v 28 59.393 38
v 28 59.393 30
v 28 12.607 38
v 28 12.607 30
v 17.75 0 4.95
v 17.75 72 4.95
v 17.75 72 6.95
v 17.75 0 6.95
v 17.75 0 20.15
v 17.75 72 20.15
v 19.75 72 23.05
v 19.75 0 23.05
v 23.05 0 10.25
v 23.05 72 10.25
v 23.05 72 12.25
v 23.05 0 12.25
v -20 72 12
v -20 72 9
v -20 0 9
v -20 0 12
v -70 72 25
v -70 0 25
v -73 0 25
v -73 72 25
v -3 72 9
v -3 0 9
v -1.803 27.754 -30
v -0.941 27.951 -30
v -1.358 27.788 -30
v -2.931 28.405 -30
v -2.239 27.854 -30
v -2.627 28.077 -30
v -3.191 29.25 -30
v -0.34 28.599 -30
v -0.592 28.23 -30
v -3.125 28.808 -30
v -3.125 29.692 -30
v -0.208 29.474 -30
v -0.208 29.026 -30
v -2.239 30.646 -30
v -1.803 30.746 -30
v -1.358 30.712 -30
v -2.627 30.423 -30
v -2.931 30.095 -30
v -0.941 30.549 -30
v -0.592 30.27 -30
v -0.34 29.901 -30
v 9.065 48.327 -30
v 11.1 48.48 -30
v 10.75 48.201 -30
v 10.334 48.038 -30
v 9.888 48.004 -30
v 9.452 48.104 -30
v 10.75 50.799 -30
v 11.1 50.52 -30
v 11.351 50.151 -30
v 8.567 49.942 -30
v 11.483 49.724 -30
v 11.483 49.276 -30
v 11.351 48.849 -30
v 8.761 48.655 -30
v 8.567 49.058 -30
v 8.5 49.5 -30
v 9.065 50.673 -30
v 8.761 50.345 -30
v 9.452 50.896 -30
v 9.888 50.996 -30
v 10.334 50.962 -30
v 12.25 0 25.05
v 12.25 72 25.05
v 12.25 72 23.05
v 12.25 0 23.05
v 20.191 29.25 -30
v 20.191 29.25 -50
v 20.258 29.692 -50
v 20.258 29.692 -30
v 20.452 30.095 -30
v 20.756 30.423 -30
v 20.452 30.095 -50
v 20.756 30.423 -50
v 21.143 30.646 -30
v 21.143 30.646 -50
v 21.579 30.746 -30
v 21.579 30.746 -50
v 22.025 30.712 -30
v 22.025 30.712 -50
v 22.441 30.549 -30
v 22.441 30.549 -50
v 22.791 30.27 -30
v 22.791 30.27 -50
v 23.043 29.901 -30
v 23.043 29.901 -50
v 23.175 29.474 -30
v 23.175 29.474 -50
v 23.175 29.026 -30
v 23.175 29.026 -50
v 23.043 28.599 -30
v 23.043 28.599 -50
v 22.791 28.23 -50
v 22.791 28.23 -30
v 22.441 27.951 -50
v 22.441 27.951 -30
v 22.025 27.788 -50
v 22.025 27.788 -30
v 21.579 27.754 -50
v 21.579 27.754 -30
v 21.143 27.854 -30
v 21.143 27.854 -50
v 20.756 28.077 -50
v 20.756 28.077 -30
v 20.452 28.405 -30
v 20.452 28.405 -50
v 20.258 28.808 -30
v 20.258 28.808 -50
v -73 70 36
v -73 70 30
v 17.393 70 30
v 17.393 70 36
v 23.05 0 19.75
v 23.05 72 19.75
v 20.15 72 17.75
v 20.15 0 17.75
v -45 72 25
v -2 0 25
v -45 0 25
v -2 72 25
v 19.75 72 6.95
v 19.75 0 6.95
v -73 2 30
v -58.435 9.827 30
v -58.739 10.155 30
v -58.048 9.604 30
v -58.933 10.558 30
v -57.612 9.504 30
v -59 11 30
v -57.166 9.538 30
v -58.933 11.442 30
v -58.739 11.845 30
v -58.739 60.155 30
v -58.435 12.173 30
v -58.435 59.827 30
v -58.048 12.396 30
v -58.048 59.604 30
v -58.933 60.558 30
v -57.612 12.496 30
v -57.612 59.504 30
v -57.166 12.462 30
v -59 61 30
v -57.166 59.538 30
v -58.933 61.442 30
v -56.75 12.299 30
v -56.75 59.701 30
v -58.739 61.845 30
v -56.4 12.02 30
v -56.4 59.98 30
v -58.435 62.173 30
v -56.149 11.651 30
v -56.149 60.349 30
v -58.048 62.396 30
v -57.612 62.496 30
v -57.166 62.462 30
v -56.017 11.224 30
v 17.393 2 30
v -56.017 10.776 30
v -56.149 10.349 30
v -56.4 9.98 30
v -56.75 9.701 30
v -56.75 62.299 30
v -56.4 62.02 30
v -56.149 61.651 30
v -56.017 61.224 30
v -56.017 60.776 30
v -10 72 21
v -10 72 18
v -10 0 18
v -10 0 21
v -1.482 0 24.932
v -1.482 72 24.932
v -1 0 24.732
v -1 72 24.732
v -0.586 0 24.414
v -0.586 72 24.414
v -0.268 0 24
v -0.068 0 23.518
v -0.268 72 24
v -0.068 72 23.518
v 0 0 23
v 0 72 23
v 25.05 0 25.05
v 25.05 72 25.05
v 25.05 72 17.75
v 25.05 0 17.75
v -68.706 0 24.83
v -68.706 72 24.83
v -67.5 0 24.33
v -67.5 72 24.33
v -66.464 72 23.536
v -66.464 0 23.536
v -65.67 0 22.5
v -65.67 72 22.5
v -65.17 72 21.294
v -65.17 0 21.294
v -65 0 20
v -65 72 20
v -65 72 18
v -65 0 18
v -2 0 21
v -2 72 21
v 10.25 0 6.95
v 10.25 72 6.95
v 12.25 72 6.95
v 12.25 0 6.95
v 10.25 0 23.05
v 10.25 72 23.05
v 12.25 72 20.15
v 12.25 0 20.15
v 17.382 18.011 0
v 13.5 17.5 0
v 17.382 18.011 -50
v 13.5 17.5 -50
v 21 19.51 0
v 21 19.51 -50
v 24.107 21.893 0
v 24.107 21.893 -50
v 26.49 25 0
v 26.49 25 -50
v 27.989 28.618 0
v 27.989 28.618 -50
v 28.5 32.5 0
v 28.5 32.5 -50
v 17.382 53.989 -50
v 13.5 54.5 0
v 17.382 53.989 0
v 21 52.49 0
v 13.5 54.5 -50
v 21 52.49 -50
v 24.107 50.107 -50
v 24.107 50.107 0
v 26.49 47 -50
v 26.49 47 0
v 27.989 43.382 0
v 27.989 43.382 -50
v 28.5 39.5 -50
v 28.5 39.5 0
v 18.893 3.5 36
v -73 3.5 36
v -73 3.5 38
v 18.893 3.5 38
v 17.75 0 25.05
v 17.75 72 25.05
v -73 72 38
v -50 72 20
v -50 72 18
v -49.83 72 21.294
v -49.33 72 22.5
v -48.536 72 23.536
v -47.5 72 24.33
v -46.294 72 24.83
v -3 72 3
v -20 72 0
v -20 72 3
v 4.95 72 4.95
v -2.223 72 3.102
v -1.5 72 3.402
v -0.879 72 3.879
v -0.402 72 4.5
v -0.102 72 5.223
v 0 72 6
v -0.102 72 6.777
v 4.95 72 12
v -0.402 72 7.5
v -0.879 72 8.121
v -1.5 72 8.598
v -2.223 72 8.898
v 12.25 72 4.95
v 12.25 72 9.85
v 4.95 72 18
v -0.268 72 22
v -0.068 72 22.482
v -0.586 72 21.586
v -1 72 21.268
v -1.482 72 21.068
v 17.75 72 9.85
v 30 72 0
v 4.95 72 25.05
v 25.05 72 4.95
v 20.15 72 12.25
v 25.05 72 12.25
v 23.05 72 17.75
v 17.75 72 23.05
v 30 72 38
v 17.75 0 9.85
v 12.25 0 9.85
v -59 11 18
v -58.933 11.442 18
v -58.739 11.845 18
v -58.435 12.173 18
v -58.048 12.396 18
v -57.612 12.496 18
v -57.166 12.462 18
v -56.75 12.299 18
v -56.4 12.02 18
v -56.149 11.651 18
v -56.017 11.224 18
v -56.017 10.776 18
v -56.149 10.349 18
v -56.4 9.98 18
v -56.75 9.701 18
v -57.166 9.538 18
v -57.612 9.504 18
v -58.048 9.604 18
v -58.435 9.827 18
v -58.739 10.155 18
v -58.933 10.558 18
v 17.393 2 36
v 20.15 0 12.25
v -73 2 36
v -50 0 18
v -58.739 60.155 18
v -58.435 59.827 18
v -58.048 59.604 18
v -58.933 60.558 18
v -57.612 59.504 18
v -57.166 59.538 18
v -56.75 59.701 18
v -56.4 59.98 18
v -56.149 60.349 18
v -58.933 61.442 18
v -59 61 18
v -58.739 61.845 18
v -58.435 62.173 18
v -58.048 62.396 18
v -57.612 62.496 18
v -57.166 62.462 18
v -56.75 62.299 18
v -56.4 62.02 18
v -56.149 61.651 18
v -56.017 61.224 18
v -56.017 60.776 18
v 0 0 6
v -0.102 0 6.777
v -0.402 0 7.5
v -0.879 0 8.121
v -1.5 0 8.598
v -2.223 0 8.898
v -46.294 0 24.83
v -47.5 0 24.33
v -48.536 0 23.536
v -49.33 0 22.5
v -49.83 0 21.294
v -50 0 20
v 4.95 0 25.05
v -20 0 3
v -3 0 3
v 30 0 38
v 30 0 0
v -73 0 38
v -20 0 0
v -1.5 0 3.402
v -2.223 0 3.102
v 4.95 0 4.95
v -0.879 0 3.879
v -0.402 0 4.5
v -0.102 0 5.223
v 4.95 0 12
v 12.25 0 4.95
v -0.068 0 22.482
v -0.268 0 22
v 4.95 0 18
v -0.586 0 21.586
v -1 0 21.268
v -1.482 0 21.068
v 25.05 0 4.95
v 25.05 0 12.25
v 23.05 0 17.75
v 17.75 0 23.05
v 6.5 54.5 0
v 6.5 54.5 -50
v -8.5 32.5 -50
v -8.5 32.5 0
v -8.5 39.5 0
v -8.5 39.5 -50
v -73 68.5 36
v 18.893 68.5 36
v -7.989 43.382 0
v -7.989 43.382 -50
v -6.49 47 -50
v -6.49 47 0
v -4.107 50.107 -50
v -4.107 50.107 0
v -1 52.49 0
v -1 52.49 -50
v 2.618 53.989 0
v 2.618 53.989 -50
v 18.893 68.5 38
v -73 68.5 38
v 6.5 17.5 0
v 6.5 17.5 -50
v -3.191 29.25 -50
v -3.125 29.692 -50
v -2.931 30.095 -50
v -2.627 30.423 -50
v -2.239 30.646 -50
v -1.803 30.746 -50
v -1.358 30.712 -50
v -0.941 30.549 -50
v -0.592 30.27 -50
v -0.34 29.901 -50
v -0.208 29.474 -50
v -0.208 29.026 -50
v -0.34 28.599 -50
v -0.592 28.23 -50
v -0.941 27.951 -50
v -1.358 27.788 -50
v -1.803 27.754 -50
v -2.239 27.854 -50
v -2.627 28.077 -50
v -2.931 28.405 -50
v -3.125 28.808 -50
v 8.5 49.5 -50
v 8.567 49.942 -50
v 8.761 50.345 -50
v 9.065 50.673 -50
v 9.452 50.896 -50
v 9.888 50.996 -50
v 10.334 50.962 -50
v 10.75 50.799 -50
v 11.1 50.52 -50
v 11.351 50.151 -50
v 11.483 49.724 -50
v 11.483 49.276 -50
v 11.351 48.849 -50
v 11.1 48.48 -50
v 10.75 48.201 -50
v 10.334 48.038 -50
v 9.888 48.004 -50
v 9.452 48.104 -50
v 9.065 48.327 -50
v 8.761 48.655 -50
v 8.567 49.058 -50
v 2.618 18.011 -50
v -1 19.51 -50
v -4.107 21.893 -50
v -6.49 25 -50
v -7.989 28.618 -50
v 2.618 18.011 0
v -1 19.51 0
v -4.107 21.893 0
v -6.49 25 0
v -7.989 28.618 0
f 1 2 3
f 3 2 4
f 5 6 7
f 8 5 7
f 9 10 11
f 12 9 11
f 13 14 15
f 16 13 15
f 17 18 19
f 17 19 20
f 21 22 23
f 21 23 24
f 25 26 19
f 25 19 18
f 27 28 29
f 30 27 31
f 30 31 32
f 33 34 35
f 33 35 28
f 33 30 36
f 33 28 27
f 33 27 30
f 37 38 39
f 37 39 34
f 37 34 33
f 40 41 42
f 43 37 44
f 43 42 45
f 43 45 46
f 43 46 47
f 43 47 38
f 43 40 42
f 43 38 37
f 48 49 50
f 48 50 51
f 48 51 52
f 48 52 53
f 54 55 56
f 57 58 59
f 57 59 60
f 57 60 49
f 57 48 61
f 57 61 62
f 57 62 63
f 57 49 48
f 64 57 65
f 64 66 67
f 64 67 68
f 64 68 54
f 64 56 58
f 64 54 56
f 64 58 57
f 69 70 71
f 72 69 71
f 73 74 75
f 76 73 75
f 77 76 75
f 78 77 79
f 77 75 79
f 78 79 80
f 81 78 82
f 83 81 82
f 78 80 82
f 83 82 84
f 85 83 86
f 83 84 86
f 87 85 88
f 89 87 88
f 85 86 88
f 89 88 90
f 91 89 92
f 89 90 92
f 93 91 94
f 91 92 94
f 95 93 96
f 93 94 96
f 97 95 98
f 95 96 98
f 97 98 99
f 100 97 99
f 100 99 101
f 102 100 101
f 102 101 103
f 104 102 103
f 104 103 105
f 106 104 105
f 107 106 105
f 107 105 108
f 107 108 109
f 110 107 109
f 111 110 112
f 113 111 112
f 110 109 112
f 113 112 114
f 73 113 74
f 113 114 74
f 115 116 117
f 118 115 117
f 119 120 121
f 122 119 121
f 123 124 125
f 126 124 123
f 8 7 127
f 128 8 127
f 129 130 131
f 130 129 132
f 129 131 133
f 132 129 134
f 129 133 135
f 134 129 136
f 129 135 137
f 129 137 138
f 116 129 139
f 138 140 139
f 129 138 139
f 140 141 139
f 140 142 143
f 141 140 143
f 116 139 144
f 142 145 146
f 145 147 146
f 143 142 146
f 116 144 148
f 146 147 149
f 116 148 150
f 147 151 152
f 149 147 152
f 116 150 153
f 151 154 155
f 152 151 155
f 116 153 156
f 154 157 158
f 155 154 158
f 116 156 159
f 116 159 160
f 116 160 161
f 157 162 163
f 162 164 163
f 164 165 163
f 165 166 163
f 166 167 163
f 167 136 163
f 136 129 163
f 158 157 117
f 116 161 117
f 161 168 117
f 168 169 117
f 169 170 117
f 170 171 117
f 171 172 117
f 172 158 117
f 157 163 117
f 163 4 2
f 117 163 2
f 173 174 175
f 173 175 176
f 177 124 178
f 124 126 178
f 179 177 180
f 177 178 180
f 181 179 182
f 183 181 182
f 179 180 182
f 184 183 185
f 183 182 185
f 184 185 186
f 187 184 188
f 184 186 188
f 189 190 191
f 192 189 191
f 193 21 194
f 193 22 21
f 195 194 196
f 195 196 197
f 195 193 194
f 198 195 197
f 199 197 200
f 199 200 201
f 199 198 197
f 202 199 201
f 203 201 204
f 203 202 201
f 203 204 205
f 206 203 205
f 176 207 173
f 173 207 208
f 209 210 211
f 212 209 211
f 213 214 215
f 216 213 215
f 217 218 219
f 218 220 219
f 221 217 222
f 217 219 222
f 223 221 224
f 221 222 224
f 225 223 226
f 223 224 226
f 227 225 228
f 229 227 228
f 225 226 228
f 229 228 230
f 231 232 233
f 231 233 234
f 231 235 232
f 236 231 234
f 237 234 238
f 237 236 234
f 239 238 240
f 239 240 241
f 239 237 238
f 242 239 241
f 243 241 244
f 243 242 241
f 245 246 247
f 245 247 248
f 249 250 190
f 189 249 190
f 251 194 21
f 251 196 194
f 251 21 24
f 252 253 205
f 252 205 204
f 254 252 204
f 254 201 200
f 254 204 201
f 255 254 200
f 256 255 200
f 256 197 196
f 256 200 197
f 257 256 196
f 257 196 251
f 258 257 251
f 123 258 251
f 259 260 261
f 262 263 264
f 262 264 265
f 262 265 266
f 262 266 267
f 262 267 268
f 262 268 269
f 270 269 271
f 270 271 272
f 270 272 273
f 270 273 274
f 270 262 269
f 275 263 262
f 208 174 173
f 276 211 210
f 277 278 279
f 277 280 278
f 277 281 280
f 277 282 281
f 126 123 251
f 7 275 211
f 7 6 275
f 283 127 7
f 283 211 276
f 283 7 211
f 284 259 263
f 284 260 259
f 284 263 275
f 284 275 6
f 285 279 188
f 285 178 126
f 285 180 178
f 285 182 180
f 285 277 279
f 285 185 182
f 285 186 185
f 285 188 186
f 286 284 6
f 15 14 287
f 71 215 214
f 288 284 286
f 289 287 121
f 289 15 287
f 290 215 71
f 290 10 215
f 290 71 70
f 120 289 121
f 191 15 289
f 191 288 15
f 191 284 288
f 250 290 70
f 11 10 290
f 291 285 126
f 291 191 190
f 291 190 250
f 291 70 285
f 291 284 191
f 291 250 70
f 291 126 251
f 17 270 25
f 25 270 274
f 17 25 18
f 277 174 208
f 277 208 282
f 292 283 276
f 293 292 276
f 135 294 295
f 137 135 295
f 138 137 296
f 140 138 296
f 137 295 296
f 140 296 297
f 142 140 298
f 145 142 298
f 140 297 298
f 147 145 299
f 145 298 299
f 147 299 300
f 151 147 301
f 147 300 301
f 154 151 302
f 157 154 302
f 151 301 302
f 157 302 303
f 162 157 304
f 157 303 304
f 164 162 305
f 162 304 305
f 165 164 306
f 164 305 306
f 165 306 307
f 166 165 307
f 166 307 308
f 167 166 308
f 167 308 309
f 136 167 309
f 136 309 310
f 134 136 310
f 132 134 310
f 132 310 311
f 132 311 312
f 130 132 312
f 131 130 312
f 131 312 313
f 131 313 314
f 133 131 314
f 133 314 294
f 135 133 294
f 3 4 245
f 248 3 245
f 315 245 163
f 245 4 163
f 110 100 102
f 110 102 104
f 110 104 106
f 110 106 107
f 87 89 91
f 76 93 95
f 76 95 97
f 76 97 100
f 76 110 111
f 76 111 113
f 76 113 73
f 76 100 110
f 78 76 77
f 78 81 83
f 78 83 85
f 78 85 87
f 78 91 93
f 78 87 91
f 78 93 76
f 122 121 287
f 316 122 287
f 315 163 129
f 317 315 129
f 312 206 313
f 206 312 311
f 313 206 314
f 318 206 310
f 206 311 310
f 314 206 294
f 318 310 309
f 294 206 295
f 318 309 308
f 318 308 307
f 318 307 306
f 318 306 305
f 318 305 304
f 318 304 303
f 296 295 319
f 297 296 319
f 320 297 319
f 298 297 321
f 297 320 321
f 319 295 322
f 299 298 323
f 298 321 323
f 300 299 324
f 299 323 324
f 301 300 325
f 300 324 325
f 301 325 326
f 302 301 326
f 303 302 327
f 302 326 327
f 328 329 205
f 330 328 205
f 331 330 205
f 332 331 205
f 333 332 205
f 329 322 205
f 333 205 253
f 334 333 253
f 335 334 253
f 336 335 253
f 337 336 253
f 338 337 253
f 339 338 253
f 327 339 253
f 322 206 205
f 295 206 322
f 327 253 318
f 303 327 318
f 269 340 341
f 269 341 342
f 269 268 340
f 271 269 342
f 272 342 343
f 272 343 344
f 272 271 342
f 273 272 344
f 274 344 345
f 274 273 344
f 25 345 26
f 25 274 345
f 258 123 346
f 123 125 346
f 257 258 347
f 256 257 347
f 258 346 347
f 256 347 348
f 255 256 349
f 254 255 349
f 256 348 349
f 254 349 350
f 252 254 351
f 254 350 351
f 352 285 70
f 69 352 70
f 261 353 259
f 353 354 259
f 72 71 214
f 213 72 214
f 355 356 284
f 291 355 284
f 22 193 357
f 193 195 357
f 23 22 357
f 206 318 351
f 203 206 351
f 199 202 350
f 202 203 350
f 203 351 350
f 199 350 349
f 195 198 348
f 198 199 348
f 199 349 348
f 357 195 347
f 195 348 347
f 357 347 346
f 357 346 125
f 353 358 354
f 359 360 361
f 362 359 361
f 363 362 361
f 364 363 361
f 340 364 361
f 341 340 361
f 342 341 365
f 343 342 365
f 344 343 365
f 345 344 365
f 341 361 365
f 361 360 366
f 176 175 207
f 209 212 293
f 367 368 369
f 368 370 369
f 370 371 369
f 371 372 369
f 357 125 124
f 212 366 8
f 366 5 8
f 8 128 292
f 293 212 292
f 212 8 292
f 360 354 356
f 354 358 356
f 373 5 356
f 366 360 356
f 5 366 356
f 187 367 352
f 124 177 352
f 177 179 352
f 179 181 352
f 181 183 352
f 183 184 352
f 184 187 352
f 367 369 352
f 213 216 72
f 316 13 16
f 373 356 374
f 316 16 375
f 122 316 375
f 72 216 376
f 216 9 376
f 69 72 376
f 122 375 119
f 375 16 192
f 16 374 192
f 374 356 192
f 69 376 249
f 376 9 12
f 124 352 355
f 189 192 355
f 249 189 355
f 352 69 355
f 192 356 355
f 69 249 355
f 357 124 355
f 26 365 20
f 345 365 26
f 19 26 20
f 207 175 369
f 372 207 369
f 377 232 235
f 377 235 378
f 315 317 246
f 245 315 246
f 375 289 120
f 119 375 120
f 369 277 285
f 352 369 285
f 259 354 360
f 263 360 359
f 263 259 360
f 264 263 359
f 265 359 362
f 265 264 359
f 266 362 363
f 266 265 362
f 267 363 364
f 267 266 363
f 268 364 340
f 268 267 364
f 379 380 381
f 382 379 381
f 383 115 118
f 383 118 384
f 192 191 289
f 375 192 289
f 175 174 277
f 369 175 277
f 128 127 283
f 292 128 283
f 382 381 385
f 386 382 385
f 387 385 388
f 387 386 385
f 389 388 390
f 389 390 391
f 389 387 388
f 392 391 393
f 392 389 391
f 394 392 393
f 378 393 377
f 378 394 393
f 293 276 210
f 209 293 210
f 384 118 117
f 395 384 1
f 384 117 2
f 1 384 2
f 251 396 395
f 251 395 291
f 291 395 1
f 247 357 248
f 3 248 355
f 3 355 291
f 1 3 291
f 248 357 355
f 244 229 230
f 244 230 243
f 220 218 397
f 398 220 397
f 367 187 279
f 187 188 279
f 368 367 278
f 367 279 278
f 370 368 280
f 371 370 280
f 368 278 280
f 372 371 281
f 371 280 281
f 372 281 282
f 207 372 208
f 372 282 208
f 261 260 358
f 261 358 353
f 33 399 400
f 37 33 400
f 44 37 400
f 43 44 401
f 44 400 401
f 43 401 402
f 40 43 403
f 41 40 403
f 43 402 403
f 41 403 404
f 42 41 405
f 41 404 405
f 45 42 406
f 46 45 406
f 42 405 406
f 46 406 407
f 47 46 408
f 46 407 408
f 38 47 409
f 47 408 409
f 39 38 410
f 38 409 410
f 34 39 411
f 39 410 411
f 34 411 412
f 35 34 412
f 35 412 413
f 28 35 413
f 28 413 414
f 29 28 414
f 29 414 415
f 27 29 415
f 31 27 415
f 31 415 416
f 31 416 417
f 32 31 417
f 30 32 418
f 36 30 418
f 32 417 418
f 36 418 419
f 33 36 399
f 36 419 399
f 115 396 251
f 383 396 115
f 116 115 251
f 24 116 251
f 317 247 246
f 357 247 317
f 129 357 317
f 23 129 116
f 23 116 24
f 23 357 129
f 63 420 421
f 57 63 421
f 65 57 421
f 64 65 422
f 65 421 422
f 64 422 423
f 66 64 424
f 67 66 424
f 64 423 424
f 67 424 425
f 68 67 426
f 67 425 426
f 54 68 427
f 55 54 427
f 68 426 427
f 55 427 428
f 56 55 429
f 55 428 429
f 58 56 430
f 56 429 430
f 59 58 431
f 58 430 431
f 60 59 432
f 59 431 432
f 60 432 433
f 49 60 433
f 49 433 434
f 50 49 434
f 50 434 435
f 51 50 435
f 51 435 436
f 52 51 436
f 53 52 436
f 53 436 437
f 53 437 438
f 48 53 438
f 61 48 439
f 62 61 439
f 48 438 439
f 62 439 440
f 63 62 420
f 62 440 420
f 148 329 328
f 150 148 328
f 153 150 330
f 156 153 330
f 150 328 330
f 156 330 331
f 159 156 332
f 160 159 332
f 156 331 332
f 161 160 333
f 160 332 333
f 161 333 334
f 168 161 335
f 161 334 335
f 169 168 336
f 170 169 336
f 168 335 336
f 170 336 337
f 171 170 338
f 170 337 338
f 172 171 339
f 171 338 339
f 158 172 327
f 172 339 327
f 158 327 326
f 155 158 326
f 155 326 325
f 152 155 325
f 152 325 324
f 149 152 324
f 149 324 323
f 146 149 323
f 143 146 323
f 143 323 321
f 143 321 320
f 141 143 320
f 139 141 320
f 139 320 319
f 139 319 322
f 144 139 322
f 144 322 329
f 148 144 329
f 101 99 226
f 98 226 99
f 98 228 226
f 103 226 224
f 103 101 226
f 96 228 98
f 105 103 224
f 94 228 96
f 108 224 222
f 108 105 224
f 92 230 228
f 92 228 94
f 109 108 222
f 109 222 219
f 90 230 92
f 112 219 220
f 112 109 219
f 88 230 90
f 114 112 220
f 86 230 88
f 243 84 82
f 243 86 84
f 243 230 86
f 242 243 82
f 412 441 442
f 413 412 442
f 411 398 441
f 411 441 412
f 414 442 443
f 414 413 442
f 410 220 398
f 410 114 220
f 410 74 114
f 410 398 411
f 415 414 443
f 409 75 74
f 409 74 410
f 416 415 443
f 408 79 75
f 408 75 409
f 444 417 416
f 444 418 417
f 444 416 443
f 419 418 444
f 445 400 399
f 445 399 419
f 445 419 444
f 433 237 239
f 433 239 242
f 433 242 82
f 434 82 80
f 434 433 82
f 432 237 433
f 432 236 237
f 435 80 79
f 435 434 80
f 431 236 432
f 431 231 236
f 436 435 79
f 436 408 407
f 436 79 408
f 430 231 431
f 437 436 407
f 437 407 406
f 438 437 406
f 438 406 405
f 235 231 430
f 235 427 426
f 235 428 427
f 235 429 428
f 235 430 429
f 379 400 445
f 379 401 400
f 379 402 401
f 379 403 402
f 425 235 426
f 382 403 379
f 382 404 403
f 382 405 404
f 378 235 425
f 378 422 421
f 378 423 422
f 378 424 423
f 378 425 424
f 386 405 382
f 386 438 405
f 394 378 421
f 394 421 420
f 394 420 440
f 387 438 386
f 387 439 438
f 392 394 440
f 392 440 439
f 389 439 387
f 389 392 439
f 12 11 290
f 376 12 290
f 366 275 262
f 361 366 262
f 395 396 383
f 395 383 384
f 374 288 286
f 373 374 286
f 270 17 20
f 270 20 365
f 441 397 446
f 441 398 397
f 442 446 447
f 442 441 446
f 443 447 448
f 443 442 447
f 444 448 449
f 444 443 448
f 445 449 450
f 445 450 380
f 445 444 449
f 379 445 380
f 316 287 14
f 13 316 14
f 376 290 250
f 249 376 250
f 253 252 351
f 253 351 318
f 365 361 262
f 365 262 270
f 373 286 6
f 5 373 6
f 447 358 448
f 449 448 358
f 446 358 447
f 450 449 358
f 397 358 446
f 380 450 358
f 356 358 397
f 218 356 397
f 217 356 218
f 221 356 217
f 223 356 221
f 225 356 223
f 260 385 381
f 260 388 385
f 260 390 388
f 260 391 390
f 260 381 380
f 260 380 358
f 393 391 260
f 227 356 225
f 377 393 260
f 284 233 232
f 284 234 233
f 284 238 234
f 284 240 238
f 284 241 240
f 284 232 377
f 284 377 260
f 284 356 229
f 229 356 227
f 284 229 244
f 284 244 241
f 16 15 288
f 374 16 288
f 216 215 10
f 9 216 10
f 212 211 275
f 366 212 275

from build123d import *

# Parameters (mm, degrees)
SKETCH5_W            = 30
SKETCH5_H            = 30
BOSS_EXTRUDE3_DEPTH  = 72
CUT_EXTRUDE1_DEPTH   = 84.570329663
SKETCH8_W            = 4.95
SKETCH8_H            = 6
CUT_EXTRUDE3_DEPTH   = 84.570329663
SKETCH10_W           = 3
SKETCH10_H           = 72
BOSS_EXTRUDE4_DEPTH  = 10
SKETCH11_W           = 37
SKETCH11_H           = 37
BOSS_EXTRUDE5_DEPTH  = 50
SKETCH14_R           = 1.5
CUT_EXTRUDE4_DEPTH   = 20
FILLET2_R            = 15
SKETCH16_W           = 5
SKETCH16_H           = 72
BOSS_EXTRUDE6_DEPTH  = 73
BOSS_EXTRUDE7_DEPTH  = 8
SKETCH20_W           = 103
SKETCH20_H           = 2
BOSS_EXTRUDE8_DEPTH  = 1.5
SKETCH21_W           = 103
SKETCH21_H           = 2
BOSS_EXTRUDE9_DEPTH  = 1.5
SKETCH22_W           = 15
SKETCH22_H           = 7
BOSS_EXTRUDE10_DEPTH = 72
FILLET4_R            = 5
FILLET5_R            = 3
FILLET6_R            = 2
SKETCH23_R           = 1.5
CUT_EXTRUDE5_DEPTH   = 124.032516027
SKETCH24_W           = 3
SKETCH24_H           = 72
BOSS_EXTRUDE11_DEPTH = 10


with BuildPart() as part:
    # Sketch5 → Boss-Extrude3 (new body)
    with BuildSketch(Plane(origin=(0, 0, 0), x_dir=(1, 0, 0), z_dir=(0, 1, 0))):
        with Locations((15, -15)):
            Rectangle(SKETCH5_W, SKETCH5_H)
    extrude(amount=BOSS_EXTRUDE3_DEPTH)

    # Sketch6 → Cut-Extrude1 (cut, through all)
    with BuildSketch(Plane(origin=(0, 72, 0), x_dir=(1, 0, 0), z_dir=(0, 1, 0))):
        Polygon((12.25, -4.95), (4.95, -4.95), (4.95, -15), (20.15, -15), (20.15, -12.25), (23.05, -10.25), (23.05, -12.25), (25.05, -12.25), (25.05, -4.95), (17.75, -4.95), (17.75, -6.95), (19.75, -6.95), (17.75, -9.85), (12.25, -9.85), (10.25, -6.95), (12.25, -6.95), align=None)
        Polygon((20.15, -15), (4.95, -15), (4.95, -25.05), (12.25, -25.05), (12.25, -23.05), (10.25, -23.05), (12.25, -20.15), (17.75, -20.15), (19.75, -23.05), (17.75, -23.05), (17.75, -25.05), (25.05, -25.05), (25.05, -17.75), (23.05, -17.75), (23.05, -19.75), (20.15, -17.75), align=None)
    extrude(amount=-CUT_EXTRUDE1_DEPTH, mode=Mode.SUBTRACT)

    # Sketch8 → Cut-Extrude3 (cut, through all)
    with BuildSketch(Plane(origin=(0, 72, 0), x_dir=(1, 0, 0), z_dir=(0, 1, 0))):
        with Locations((2.475, -15)):
            Rectangle(SKETCH8_W, SKETCH8_H)
    extrude(amount=-CUT_EXTRUDE3_DEPTH, mode=Mode.SUBTRACT)

    # Sketch10 → Boss-Extrude4 (add)
    with BuildSketch(Plane.ZY):
        with Locations((1.5, 36)):
            Rectangle(SKETCH10_W, SKETCH10_H)
        with Locations((10.5, 36)):
            Rectangle(SKETCH10_W, SKETCH10_H)
        with Locations((19.5, 36)):
            Rectangle(SKETCH10_W, SKETCH10_H)
    extrude(amount=BOSS_EXTRUDE4_DEPTH)

    # Sketch11 → Boss-Extrude5 (add)
    with BuildSketch(Plane(origin=(0, 0, 0), x_dir=(-1, 0, 0), z_dir=(0, 0, -1))):
        with Locations((-10, 36)):
            Rectangle(SKETCH11_W, SKETCH11_H)
    extrude(amount=BOSS_EXTRUDE5_DEPTH)

    # Sketch14 → Cut-Extrude4 (cut)
    with BuildSketch(Plane(origin=(0, 0, -50), x_dir=(-1, 0, 0), z_dir=(0, 0, -1))):
        with Locations((-10, 49.5)):
            Circle(SKETCH14_R)
        with Locations((1.691342951, 29.25)):
            Circle(SKETCH14_R)
        with Locations((-21.691342951, 29.25)):
            Circle(SKETCH14_R)
    extrude(amount=-CUT_EXTRUDE4_DEPTH, mode=Mode.SUBTRACT)

    # Fillet2
    fillet2_edges = [part.edges().sort_by_distance(p)[0] for p in [
        (28.5, 54.5, -25),
        (28.5, 17.5, -25),
        (-8.5, 17.5, -25),
        (-8.5, 54.5, -25),
    ]]
    fillet(fillet2_edges, radius=FILLET2_R)

    # Sketch16 → Boss-Extrude6 (add)
    with BuildSketch(Plane.ZY):
        with Locations((27.5, 36)):
            Rectangle(SKETCH16_W, SKETCH16_H)
    extrude(amount=BOSS_EXTRUDE6_DEPTH)

    # Sketch19 → Boss-Extrude7 (add)
    with BuildSketch(Plane.XY.offset(30)):
        Polygon((-73, 72), (-73, 70), (17.393398282, 70), (28, 59.393398282), (28, 12.606601718), (17.393398282, 2), (-73, 2), (-73, 0), (30, 0), (30, 72), align=None)
    extrude(amount=BOSS_EXTRUDE7_DEPTH)

    # Sketch20 → Boss-Extrude8 (add)
    with BuildSketch(Plane.XZ.offset(-70)):
        with Locations((-21.5, 37)):
            Rectangle(SKETCH20_W, SKETCH20_H)
    extrude(amount=BOSS_EXTRUDE8_DEPTH)

    # Sketch21 → Boss-Extrude9 (add)
    with BuildSketch(Plane(origin=(0, 2, 0), x_dir=(1, 0, 0), z_dir=(0, 1, 0))):
        with Locations((-21.5, -37)):
            Rectangle(SKETCH21_W, SKETCH21_H)
    extrude(amount=BOSS_EXTRUDE9_DEPTH)

    # Sketch22 → Boss-Extrude10 (add)
    with BuildSketch(Plane(origin=(0, 72, 0), x_dir=(1, 0, 0), z_dir=(0, 1, 0))):
        with Locations((-57.5, -21.5)):
            Rectangle(SKETCH22_W, SKETCH22_H)
    extrude(amount=-BOSS_EXTRUDE10_DEPTH)

    # Fillet4
    fillet4_edges = [part.edges().sort_by_distance(p)[0] for p in [
        (-65, 36, 25),
        (-50, 36, 25),
    ]]
    fillet(fillet4_edges, radius=FILLET4_R)

    # Fillet5
    fillet5_edges = [part.edges().sort_by_distance(p)[0] for p in [
        (0, 36, 3),
        (0, 36, 9),
    ]]
    fillet(fillet5_edges, radius=FILLET5_R - 0.0001)  # a hair under: the kernel refuses the full size

    # Fillet6
    fillet6_edges = [part.edges().sort_by_distance(p)[0] for p in [
        (0, 36, 21),
        (0, 36, 25),
    ]]
    fillet(fillet6_edges, radius=FILLET6_R - 0.0001)  # a hair under: the kernel refuses the full size

    # Sketch23 → Cut-Extrude5 (cut, through all)
    with BuildSketch(Plane(origin=(0, 0, 18), x_dir=(-1, 0, 0), z_dir=(0, 0, -1))):
        with Locations((57.5, 61)):
            Circle(SKETCH23_R)
        with Locations((57.5, 11)):
            Circle(SKETCH23_R)
    extrude(amount=-CUT_EXTRUDE5_DEPTH, mode=Mode.SUBTRACT)

    # Sketch24 → Boss-Extrude11 (add)
    with BuildSketch(Plane.ZY.offset(10)):
        with Locations((1.5, 36)):
            Rectangle(SKETCH24_W, SKETCH24_H)
        with Locations((10.5, 36)):
            Rectangle(SKETCH24_W, SKETCH24_H)
    extrude(amount=BOSS_EXTRUDE11_DEPTH)


solid = part.part
